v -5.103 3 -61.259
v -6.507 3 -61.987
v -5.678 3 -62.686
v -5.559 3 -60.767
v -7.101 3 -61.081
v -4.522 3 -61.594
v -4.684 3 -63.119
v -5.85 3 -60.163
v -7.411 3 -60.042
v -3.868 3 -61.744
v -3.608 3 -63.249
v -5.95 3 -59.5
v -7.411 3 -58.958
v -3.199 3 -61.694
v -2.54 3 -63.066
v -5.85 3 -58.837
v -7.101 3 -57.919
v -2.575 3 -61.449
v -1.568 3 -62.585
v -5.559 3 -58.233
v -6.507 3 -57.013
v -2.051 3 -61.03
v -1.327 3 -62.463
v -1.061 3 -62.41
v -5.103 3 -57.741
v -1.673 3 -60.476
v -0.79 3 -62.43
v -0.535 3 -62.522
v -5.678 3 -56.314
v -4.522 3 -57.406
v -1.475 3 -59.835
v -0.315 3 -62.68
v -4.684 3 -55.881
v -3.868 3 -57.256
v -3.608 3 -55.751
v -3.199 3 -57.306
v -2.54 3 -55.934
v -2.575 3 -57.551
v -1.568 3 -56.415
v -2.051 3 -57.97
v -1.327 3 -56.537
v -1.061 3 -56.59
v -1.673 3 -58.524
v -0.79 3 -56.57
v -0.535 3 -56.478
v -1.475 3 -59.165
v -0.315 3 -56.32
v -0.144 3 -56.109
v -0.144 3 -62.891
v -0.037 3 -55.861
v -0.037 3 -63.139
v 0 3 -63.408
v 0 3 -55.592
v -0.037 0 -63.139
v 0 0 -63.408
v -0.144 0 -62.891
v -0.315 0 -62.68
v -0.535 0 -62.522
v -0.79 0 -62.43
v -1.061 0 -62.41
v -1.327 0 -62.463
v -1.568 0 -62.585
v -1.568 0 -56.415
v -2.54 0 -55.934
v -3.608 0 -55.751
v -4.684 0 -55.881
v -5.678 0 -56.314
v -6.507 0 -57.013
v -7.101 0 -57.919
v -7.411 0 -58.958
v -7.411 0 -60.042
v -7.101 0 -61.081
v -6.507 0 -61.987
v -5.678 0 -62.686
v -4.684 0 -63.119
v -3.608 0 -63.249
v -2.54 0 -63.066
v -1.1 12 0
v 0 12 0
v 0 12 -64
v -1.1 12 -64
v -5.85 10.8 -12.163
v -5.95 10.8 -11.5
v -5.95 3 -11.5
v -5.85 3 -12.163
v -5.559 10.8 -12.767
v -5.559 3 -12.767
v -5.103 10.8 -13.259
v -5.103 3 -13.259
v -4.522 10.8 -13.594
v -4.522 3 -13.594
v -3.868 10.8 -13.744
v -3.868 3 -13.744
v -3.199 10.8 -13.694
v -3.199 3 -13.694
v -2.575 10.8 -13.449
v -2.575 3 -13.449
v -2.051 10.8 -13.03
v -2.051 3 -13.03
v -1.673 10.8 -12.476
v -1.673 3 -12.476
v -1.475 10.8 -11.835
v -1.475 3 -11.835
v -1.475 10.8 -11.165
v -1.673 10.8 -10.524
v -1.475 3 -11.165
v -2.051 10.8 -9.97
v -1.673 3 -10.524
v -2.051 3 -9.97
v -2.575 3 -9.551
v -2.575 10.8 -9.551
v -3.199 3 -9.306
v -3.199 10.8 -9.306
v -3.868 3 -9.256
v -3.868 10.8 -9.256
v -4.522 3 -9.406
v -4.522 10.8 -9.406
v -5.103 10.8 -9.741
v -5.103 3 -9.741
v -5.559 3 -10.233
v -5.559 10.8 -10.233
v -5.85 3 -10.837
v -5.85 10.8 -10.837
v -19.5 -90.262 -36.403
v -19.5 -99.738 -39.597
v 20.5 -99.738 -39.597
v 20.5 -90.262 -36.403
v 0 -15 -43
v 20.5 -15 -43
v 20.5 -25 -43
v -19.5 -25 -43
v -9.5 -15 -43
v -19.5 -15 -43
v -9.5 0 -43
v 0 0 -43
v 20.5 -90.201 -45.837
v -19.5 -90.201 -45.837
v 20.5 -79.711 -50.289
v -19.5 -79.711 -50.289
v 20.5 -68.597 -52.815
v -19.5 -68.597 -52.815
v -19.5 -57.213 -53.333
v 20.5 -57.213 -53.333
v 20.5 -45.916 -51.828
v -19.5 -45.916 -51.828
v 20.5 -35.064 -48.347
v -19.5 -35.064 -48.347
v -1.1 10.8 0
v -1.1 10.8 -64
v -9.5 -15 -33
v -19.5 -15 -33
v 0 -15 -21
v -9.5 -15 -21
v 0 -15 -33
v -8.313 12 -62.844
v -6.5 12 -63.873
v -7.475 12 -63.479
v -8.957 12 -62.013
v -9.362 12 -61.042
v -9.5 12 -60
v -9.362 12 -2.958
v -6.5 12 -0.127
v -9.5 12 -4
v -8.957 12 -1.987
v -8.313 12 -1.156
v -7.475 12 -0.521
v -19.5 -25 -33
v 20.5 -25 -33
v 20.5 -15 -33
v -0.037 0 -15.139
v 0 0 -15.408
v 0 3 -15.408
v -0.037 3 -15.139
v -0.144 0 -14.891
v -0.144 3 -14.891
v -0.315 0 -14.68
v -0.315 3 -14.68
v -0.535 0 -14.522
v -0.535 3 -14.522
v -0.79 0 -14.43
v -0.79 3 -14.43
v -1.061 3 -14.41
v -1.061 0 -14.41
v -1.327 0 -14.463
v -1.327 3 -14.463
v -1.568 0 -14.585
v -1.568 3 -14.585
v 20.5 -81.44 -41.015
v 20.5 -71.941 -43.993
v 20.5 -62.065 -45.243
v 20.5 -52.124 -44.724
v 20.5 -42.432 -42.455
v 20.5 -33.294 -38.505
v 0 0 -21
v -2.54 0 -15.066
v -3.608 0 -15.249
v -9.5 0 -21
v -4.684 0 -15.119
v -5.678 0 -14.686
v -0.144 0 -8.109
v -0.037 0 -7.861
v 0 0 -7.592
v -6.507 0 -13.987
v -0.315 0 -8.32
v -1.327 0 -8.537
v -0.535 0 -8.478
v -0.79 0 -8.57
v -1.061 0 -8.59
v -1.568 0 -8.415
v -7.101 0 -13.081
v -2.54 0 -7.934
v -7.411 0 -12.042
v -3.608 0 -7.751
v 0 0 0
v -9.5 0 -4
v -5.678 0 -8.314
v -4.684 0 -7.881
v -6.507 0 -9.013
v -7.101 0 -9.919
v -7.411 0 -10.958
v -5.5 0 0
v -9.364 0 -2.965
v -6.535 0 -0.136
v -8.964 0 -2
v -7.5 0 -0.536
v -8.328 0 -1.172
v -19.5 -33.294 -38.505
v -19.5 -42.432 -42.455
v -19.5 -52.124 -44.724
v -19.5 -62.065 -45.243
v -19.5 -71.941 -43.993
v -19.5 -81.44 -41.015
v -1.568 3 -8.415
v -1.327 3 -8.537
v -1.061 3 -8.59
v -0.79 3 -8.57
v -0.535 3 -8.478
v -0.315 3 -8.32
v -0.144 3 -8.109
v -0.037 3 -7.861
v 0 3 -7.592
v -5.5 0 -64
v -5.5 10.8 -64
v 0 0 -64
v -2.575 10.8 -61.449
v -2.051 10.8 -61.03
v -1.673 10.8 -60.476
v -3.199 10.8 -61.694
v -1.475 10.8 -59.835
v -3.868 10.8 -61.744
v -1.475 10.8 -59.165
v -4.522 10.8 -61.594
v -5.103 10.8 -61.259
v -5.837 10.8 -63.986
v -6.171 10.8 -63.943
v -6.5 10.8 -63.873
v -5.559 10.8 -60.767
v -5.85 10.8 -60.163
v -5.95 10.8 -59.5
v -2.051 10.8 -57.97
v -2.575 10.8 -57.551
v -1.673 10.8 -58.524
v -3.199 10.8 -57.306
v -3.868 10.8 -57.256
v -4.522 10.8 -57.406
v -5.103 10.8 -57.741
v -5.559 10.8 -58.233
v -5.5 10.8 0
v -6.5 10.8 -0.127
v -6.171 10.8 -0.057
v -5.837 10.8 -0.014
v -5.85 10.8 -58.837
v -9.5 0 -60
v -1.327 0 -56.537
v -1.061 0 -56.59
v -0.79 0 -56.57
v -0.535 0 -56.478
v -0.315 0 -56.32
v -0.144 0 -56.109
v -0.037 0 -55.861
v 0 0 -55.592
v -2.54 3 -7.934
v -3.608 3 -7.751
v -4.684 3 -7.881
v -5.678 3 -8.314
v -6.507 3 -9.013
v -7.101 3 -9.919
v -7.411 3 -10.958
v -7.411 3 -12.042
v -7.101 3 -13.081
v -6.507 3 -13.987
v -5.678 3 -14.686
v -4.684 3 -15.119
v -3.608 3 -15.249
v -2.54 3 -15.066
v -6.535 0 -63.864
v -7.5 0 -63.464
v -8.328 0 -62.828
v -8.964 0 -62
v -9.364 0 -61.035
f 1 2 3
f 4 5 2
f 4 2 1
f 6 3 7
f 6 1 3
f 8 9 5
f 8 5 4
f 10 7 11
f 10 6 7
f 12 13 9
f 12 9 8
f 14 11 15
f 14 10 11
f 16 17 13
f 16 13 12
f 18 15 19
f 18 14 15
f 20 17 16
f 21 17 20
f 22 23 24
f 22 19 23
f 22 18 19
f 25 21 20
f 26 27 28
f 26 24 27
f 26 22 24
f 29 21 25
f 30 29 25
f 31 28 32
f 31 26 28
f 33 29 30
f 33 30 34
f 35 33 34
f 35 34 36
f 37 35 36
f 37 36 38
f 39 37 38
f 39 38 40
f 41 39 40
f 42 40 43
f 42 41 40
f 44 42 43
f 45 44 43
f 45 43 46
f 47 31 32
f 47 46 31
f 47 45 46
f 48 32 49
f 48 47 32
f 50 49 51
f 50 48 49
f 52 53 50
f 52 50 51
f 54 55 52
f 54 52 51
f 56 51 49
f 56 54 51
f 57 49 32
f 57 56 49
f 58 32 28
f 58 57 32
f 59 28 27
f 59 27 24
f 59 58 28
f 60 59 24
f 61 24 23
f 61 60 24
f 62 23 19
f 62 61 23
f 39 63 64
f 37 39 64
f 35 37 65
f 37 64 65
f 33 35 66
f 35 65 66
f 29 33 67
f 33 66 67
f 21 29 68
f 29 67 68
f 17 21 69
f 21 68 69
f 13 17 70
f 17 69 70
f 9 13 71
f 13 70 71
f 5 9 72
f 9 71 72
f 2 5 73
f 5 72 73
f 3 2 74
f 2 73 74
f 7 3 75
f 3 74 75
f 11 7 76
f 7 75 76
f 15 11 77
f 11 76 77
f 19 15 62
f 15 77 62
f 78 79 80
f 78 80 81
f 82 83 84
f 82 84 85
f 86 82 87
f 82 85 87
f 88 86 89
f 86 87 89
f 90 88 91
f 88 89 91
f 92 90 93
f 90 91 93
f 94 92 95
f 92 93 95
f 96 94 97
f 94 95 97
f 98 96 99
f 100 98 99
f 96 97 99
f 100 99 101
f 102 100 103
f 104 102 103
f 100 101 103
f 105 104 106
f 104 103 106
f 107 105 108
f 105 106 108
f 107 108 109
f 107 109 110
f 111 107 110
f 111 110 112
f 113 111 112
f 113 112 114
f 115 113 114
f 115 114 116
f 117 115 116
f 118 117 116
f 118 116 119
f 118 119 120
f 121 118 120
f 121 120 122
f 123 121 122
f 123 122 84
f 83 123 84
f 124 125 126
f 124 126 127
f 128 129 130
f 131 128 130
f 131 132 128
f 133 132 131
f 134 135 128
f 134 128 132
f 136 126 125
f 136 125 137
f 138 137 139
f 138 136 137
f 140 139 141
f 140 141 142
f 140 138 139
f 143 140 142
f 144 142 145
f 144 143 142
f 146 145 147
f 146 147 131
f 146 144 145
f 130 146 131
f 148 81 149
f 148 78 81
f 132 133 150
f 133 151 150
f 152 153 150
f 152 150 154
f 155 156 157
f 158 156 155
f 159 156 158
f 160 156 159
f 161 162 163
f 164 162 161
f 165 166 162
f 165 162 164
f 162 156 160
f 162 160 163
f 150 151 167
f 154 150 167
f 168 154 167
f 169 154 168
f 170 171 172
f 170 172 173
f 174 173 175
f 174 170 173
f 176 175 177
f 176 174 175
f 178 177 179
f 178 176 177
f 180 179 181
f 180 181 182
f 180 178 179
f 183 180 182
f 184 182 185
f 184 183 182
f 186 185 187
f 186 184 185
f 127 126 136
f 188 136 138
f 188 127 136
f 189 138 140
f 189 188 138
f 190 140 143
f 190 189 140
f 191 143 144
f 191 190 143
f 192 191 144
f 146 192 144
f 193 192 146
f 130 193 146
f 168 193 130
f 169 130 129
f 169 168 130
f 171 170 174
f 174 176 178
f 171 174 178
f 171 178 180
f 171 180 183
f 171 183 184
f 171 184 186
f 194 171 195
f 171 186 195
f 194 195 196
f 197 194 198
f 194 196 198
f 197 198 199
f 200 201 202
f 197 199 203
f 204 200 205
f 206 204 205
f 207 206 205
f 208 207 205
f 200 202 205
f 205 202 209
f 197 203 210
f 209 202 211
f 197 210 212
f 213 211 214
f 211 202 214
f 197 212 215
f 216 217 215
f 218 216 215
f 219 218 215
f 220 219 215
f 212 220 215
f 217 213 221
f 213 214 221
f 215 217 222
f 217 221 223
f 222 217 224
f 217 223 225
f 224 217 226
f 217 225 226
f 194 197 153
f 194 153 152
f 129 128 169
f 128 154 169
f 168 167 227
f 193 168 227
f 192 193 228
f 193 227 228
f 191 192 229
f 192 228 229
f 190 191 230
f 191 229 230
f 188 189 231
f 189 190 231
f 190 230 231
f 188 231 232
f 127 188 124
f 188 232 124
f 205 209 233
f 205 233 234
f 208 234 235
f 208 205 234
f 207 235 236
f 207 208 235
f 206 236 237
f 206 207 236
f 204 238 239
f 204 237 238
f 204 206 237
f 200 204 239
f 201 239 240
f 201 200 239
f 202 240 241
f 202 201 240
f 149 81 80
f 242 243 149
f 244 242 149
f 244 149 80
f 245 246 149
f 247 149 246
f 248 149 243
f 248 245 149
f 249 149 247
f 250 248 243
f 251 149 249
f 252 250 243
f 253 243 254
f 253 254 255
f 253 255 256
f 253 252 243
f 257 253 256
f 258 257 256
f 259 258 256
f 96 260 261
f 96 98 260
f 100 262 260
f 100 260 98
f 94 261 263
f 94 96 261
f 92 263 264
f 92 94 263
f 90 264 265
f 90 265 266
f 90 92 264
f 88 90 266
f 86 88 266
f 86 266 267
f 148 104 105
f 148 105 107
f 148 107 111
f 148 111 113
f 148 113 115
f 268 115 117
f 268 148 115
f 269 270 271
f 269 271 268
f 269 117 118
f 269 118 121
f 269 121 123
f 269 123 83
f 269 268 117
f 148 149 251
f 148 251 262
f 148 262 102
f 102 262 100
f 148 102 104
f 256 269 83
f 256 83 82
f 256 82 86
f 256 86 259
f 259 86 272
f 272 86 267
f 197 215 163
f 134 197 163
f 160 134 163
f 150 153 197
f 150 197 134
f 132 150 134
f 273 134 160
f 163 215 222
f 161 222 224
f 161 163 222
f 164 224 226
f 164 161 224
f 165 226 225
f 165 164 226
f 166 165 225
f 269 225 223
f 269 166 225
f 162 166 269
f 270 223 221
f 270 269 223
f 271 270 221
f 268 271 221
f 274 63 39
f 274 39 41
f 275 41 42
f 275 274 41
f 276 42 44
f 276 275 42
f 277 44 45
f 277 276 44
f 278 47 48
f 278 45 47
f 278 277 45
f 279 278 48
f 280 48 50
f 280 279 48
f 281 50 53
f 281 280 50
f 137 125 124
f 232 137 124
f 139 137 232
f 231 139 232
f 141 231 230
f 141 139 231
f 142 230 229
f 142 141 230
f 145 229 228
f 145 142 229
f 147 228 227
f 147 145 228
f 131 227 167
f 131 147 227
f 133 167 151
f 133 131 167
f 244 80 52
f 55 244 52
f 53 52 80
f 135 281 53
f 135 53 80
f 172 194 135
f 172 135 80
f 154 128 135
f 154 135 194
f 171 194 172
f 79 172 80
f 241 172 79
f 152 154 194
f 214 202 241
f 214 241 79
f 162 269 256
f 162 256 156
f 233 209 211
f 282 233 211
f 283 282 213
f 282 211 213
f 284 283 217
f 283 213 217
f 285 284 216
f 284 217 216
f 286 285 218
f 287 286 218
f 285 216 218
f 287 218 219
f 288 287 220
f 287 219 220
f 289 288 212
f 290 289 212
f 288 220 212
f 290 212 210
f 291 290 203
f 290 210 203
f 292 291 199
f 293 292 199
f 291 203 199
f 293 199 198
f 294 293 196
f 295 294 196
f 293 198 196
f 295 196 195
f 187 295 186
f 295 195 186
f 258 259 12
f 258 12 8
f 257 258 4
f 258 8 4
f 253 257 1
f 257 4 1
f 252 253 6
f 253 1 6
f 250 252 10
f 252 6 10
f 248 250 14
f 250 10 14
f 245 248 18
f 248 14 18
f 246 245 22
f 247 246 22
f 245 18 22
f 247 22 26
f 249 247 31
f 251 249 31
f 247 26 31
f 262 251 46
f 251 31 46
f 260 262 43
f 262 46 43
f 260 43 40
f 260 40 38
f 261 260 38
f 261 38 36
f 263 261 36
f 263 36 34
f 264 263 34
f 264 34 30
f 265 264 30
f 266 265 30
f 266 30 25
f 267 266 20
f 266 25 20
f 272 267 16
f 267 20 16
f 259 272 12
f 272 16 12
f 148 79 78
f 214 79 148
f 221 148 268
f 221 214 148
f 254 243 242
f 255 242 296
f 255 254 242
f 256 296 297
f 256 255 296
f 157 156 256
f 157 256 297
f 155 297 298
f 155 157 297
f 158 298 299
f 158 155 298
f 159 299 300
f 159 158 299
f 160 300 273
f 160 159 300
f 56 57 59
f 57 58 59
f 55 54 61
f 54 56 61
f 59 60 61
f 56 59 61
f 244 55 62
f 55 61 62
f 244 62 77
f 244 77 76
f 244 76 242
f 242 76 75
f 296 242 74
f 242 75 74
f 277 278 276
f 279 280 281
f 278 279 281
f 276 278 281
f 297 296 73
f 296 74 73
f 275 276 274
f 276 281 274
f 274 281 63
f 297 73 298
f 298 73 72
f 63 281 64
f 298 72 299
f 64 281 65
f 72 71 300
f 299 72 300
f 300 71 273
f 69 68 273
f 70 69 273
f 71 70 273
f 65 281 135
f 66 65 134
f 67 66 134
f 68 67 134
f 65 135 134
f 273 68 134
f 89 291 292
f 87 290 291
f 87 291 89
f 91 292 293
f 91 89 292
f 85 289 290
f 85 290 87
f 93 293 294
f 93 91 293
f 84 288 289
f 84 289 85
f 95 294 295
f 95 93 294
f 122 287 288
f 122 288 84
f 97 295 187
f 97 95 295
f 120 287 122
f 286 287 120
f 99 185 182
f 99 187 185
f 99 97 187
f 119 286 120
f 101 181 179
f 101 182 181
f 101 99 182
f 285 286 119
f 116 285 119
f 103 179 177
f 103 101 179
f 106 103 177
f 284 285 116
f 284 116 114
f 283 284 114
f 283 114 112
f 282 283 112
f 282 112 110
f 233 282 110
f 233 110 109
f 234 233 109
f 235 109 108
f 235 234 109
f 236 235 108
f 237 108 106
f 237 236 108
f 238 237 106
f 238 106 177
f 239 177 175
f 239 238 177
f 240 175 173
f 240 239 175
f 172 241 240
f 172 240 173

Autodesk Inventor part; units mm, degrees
ref_plane "YZ Plane" through (0, 0, 0) normal (1, 0, 0) x (0, 1, 0)
ref_plane "XZ Plane" through (0, 0, 0) normal (0, 1, 0) x (-1, 0, 0)
ref_plane "XY Plane" through (0, 0, 0) normal (0, 0, 1) x (1, 0, 0)
sketch "Sketch1" plane through (0, 0, 0) normal (0, 1, 0) x (-1, 0, 0)
  line L0 (0, 0) -> (9.5, 0)
  line L1 (9.5, 0) -> (9.5, -64)
  line L2 (9.5, -64) -> (0, -64)
  line L3 (0, -64) -> (0, 0)
  circle A0 centre (3.7, -11.5) radius 2.25
  circle A1 centre (3.7, -59.5) radius 2.25
  line L4 (3.7, -11.5) -> (3.7, -59.5) construction
  dimension "d1" = 9.5
  dimension "d2" = 64
  dimension "d3" = 4.5
  dimension "d4" = 48
  dimension "d6" = 3.7
  dimension "d17" = 4.5
extrude "Extrusion1" add sketch "Sketch1" along normal blind 12
sketch "Sketch2" plane through (-9.5, 0, 0) normal (0, 0, 1) x (1, 0, 0)
  line L0 (9.5, 12) -> (0, 12) projected
  line L1 (3, 12) -> (8.4, 12)
  line L2 (8.4, 12) -> (8.4, 10.8)
  line L3 (8.4, 10.8) -> (3, 10.8)
  line L4 (3, 10.8) -> (3, 12)
  line L5 (9.5, 0) -> (9.5, 12) projected
  line L6 (3.55, 0) -> (8.05, 0) projected
  line L7 (3.55, 12) -> (8.05, 12) projected
  line L8 (9.5, 0) -> (9.5, 12) projected
  line L9 (9.5, 0) -> (9.5, 12) projected
  line L10 (3.55, 12) -> (8.05, 12) projected
  line L11 (3.55, 12) -> (3.55, 0) projected
  line L12 (3.55, 12) -> (8.05, 12) projected
  line L13 (3.55, 0) -> (8.05, 0) projected
  line L14 (3.55, 12) -> (8.05, 12) projected
  line L15 (3.55, 0) -> (8.05, 0) projected
  line L16 (3.55, 12) -> (8.05, 12) projected
  line L17 (3.55, 0) -> (8.05, 0) projected
  dimension "d9" = 1.1
  dimension "d10" = 5.4
  dimension "d11" = 1.2
  dimension "d76" = 12
extrude "Extrusion2" cut sketch "Sketch2" against normal up to next
sketch "Sketch3" plane through (0, 0, 0) normal (0, -1, 0) x (1, 0, 0)
  circle A0 centre (-3.7, -11.5) radius 2.25 projected
  circle A1 centre (-3.7, -11.5) radius 3.75
  circle A2 centre (-3.7, -59.5) radius 2.25 projected
  circle A3 centre (-3.7, -59.5) radius 3.75
  point P0 (0, 0)
  dimension "d14" = 7.5
extrude "Extrusion3" cut sketch "Sketch3" against normal blind 3
fillet "Fillet1" radius 1 4 edges at (0, 1.5, -58.8897) (0, 1.5, -60.1103) (0, 1.5, -10.8897) (0, 1.5, -12.1103)
fillet "Fillet2" radius 4 2 edges at (-9.5, 6, -64) (-9.5, 6, 0)
sketch "Sketch15" plane through (0, 0, 0) normal (0, -1, 0) x (1, 0, 0)
  line L0 (0, 0) -> (0, -7.592) projected
  line L1 (-9.5, -32) -> (-9.5, -21)
  line L2 (-9.5, -21) -> (0, -21)
  line L3 (0, -21) -> (0, -43)
  line L4 (0, -43) -> (-9.5, -43)
  line L5 (-9.5, -43) -> (-9.5, -32)
  dimension "d79" = 11
  dimension "d80" = 22
extrude "Extrusion15" add sketch "Sketch15" along normal blind 15
sketch "Sketch21" plane through (0, -15, 0) normal (0, -1, 0) x (1, 0, 0)
  line L0 (-9.5, -43) -> (-19.5, -43)
  line L1 (-19.5, -43) -> (-19.5, -33)
  line L2 (-19.5, -33) -> (20.5, -33)
  line L3 (20.5, -33) -> (20.5, -43)
  line L4 (20.5, -43) -> (-9.5, -43)
  point P0 (0, 0)
  dimension "d93" = 10
  dimension "d94" = 10
  dimension "d95" = 40
  dimension "d96" = 10
extrude "Extrusion17" add sketch "Sketch21" along normal blind 10
sketch "Sketch27" plane through (0, -25, 0) normal (0, -1, 0) x (1, 0, 0)
  line L0 (-19.5, -33) -> (-19.5, -43) projected
  line L1 (-19.5, -43) -> (20.5, -43) projected
  line L2 (-19.5, -33) -> (20.5, -33)
  line L3 (20.5, -33) -> (20.5, -43)
  line L4 (20.5, -43) -> (-19.5, -43)
  line L5 (-19.5, -43) -> (-19.5, -33)
  point P0 (0, 0)
sketch "Sketch28" plane through (20.5, -15, -33) normal (1, 0, 0) x (0, 0, -1)
  line L0 (10, -10) -> (0, -10) projected
  arc A0 (5, -80) -> (5, -10) centre (-43.734, -45) ccw
  point P0 (-33, 15)
  dimension "d101" = 70
  dimension "d102" = 60
sweep "Sweep1" add profiles "Sketch27" path "Sketch28" path curves A0
properties part number "Front"
